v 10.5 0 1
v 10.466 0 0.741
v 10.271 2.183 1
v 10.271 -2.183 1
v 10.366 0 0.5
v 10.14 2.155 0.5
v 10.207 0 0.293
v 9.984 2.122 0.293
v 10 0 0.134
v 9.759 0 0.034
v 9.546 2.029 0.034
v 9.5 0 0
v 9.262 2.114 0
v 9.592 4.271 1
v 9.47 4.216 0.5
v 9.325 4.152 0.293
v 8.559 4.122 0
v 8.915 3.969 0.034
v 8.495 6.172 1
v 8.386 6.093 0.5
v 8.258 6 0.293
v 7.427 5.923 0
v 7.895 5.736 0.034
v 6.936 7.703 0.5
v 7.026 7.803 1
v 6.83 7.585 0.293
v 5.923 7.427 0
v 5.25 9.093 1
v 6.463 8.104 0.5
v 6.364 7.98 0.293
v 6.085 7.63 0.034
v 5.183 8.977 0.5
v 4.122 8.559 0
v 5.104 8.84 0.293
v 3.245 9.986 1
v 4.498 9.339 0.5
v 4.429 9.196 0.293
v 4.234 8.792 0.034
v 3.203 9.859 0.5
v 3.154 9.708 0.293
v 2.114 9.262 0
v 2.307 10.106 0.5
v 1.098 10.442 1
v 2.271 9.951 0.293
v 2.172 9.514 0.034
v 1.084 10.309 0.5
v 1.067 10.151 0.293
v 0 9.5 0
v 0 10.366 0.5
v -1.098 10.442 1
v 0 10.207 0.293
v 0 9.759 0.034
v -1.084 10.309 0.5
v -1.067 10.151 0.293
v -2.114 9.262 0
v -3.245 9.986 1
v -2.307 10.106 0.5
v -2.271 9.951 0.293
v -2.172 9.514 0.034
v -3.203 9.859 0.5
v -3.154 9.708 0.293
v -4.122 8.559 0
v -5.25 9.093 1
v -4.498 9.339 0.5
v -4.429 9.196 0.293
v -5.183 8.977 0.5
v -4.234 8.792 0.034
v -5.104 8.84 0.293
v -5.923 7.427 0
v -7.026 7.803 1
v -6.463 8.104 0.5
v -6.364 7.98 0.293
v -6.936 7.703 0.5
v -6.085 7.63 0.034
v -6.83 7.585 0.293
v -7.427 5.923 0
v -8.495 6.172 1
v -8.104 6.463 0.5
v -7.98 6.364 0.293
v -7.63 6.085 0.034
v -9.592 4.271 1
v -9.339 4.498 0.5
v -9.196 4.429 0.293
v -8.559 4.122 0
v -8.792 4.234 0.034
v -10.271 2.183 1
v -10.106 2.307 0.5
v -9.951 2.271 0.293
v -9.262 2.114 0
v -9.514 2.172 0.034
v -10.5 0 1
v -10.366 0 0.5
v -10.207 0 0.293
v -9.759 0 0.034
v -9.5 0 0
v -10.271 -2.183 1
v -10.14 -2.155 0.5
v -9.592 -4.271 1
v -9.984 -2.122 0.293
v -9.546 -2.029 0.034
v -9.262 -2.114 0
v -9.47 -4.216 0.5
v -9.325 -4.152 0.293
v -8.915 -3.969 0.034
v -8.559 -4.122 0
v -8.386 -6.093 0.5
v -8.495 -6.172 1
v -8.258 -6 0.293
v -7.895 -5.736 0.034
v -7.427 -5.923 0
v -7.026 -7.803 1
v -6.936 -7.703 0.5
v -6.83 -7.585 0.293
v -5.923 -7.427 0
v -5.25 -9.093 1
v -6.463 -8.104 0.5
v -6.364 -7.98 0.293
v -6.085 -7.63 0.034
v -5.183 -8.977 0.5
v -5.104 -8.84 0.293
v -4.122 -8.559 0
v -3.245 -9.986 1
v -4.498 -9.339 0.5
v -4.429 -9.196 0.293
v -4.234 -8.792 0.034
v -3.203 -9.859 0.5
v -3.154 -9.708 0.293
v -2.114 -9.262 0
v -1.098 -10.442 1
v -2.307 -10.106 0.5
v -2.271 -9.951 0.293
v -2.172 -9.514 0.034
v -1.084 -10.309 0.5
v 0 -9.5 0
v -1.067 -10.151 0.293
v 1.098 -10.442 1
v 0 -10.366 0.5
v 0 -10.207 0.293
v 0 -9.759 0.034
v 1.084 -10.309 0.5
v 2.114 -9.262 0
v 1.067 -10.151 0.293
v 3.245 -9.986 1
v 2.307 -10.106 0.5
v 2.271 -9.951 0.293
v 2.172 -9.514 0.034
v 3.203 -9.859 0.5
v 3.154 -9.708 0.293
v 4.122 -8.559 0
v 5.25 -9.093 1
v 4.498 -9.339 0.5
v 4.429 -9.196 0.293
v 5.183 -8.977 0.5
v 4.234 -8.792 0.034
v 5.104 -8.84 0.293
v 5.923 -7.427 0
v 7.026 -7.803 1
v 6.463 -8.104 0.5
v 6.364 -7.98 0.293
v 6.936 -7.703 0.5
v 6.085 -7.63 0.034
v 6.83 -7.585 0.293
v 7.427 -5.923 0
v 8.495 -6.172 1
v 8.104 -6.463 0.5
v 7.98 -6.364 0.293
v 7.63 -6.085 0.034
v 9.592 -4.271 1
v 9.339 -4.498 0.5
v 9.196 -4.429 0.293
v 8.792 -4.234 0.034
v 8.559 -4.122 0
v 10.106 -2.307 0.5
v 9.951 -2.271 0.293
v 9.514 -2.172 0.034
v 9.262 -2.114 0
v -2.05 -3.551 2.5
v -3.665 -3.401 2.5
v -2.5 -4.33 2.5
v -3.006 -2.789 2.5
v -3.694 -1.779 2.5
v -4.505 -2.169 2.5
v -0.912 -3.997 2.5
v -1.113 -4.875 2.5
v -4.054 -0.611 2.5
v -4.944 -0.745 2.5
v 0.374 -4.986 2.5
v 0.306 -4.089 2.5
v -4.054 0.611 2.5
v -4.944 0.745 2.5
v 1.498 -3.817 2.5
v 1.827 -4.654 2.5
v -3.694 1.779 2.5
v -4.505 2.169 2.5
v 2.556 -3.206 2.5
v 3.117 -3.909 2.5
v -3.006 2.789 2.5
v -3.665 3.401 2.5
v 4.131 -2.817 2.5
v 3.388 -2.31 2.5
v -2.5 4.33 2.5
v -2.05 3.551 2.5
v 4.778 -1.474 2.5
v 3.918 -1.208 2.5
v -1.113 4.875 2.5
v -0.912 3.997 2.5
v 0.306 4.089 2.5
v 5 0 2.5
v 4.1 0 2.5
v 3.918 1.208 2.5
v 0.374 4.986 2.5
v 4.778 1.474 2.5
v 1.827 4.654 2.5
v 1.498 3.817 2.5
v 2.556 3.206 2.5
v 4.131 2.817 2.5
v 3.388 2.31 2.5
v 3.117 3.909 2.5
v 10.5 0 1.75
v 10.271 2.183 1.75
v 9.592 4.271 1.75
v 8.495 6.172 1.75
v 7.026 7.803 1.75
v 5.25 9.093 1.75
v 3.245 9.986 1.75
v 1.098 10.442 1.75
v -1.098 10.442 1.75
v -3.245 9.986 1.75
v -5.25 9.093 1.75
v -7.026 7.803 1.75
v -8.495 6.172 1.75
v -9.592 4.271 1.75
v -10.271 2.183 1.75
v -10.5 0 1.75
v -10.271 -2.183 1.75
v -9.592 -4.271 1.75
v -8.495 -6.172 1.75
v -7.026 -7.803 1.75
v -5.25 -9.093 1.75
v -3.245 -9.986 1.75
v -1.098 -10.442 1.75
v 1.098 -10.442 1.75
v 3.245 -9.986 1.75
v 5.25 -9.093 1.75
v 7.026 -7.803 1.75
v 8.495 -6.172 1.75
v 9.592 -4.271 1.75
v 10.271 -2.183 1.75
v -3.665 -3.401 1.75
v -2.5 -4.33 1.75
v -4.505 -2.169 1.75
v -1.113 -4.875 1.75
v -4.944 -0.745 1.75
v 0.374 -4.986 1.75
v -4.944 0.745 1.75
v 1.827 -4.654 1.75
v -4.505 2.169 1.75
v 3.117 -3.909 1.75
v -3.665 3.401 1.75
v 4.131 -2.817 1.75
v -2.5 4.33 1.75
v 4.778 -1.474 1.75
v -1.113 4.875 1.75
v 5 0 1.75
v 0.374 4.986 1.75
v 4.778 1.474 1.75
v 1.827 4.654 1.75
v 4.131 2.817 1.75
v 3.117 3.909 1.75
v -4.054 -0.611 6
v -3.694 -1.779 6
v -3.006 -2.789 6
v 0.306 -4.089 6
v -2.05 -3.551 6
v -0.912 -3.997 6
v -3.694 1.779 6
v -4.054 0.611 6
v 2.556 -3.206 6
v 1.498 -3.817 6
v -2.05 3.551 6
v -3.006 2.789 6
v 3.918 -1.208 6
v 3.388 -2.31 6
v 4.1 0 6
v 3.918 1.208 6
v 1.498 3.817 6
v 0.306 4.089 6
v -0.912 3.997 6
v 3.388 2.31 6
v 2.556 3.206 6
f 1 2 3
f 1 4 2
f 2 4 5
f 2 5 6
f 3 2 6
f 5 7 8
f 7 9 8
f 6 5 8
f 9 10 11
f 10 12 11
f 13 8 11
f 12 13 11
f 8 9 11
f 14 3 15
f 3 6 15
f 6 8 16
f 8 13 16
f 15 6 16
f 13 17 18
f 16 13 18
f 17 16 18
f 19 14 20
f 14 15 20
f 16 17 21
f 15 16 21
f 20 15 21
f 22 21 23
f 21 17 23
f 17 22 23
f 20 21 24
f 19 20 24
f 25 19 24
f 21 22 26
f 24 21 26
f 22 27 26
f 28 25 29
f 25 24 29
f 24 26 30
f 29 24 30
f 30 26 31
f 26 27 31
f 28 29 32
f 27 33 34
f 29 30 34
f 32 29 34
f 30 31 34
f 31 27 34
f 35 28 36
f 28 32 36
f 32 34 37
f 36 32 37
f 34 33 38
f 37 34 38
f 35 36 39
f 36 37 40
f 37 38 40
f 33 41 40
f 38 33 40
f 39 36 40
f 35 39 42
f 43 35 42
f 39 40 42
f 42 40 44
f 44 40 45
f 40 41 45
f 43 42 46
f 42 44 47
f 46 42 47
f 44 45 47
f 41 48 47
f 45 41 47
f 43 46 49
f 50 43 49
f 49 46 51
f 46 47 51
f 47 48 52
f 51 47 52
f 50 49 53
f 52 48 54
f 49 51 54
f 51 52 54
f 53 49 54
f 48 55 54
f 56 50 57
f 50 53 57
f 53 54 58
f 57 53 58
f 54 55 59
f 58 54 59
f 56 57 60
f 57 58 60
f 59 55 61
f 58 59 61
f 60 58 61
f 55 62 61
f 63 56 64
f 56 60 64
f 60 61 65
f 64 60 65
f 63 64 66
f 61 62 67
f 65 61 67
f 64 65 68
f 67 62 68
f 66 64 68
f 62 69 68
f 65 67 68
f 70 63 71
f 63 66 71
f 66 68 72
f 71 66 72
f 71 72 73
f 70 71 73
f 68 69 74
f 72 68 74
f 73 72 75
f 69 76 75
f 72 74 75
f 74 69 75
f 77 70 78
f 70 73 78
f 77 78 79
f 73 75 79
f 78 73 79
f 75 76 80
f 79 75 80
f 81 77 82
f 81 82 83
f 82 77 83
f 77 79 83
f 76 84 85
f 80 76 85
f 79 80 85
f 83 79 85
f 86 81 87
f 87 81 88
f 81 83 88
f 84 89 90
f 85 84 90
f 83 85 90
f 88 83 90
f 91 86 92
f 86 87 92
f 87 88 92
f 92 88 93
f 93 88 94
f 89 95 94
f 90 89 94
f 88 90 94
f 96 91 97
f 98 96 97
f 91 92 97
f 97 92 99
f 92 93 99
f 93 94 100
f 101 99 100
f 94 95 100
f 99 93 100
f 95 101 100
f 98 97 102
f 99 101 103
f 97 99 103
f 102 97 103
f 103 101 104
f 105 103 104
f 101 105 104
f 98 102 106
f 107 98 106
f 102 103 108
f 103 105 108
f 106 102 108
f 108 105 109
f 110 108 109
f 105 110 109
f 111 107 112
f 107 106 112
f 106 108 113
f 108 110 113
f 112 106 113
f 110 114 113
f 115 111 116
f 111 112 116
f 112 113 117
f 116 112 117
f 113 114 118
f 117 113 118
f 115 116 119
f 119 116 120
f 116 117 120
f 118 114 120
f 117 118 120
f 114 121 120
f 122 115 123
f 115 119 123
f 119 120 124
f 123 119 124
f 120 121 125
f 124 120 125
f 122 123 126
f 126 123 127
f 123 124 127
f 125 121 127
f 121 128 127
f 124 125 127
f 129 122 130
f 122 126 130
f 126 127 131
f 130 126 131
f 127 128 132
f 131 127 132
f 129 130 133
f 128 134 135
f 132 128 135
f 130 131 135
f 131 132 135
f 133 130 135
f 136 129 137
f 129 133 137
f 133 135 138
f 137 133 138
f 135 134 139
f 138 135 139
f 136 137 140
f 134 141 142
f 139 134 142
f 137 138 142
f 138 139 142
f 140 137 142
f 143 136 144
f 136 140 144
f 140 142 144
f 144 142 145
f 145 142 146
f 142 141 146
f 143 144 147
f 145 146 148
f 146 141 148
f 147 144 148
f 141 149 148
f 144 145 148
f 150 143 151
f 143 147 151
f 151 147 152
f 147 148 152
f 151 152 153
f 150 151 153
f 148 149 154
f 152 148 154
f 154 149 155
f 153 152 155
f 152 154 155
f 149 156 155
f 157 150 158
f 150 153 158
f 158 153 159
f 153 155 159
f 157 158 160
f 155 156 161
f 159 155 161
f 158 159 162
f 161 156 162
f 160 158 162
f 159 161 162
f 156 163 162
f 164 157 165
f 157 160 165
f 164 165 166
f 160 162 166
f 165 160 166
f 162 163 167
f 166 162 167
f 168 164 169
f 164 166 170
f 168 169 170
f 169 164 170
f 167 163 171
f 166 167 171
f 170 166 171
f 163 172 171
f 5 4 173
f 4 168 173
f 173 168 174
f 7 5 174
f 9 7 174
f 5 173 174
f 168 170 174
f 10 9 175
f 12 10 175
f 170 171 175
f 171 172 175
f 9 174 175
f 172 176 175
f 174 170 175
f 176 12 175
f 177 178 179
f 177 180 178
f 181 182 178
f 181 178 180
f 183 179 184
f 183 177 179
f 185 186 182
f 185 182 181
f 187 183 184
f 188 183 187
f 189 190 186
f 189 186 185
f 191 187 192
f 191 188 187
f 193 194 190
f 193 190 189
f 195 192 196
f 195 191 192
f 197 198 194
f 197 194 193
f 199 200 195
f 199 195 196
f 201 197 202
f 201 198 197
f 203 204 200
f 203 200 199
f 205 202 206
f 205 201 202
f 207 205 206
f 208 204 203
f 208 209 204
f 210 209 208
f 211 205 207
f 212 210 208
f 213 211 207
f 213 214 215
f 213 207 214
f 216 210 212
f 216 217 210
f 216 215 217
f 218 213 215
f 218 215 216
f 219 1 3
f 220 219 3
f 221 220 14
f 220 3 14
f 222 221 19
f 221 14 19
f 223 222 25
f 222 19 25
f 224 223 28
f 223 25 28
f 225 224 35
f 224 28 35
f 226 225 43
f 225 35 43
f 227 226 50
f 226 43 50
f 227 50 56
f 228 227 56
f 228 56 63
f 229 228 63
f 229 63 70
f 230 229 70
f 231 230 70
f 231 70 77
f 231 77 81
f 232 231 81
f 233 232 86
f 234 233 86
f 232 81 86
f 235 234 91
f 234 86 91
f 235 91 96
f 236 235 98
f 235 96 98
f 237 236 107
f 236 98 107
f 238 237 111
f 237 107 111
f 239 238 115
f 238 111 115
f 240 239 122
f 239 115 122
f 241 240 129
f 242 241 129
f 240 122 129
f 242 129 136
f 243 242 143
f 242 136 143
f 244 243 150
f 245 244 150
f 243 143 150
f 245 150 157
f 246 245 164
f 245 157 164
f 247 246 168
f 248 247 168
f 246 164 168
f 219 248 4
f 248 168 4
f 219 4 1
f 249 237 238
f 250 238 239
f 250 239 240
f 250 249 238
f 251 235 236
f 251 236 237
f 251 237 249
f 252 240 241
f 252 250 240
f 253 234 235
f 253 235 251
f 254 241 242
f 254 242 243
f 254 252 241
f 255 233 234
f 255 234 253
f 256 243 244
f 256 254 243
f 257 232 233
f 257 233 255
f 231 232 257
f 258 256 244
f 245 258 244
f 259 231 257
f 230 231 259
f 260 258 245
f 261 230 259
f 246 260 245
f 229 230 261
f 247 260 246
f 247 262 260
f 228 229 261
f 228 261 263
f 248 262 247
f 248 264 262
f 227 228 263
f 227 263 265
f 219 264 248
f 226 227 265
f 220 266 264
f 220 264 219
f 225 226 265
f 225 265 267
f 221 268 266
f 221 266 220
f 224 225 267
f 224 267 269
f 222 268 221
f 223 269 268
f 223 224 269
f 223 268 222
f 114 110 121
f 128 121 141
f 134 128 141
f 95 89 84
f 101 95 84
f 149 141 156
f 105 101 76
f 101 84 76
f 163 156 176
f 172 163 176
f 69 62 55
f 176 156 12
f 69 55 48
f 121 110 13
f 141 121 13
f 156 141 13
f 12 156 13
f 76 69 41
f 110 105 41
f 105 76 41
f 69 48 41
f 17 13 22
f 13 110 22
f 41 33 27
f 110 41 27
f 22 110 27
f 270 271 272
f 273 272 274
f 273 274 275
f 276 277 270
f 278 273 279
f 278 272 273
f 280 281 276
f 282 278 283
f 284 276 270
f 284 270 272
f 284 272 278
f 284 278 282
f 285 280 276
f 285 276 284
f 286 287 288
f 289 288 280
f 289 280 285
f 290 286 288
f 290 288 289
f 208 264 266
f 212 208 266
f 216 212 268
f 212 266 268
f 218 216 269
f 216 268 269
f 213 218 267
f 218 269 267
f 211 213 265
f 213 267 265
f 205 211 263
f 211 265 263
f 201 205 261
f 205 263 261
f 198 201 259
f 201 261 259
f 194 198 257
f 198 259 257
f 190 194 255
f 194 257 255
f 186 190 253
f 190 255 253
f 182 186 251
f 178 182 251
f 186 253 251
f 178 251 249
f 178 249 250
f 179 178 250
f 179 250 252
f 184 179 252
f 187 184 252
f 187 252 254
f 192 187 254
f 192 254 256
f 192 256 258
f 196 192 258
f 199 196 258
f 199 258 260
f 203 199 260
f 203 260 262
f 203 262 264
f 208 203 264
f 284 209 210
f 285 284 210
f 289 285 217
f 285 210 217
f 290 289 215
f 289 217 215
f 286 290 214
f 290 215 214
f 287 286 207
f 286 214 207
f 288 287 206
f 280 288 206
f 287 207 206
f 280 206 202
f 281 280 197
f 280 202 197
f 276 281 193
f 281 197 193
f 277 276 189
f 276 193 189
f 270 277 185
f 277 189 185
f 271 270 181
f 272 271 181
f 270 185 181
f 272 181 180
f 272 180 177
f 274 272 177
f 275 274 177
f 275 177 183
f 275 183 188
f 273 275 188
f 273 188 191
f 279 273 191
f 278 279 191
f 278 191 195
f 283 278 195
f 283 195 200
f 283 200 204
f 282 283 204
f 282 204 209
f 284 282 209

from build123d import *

# Parameters (mm, degrees)
F0_R     = 10.5
F0_R_2   = 5
F1_DEPTH = 1.75
F0_R_3   = 4.1
F2_DEPTH = 6
F3_DEPTH = 2.5
F5_R     = 1


with BuildPart() as f1:
    # F0 (on Top) → F1 (new body)
    with BuildSketch(Plane.XY):
        Circle(F0_R)
        Circle(F0_R_2, mode=Mode.SUBTRACT)
    extrude(amount=F1_DEPTH)


with BuildPart() as f2:
    # F0 (on Top) → F2 (new body)
    with BuildSketch(Plane.XY):
        Circle(F0_R_3)
    extrude(amount=F2_DEPTH)


with BuildPart() as f3:
    # F0 (on Top) → F3 (new body)
    with BuildSketch(Plane.XY):
        Circle(F0_R_2)
        Circle(F0_R_3, mode=Mode.SUBTRACT)
    extrude(amount=F3_DEPTH)


with BuildPart() as f1_1:
    add(f1.part)

    # F4: union F3, F2
    add(f3.part)
    add(f2.part)

    # F5
    f5_edges = [f1_1.edges().sort_by_distance(p)[0] for p in [
        (-10.5, 0, 0),
    ]]
    fillet(f5_edges, radius=F5_R)


solid = f1_1.part
